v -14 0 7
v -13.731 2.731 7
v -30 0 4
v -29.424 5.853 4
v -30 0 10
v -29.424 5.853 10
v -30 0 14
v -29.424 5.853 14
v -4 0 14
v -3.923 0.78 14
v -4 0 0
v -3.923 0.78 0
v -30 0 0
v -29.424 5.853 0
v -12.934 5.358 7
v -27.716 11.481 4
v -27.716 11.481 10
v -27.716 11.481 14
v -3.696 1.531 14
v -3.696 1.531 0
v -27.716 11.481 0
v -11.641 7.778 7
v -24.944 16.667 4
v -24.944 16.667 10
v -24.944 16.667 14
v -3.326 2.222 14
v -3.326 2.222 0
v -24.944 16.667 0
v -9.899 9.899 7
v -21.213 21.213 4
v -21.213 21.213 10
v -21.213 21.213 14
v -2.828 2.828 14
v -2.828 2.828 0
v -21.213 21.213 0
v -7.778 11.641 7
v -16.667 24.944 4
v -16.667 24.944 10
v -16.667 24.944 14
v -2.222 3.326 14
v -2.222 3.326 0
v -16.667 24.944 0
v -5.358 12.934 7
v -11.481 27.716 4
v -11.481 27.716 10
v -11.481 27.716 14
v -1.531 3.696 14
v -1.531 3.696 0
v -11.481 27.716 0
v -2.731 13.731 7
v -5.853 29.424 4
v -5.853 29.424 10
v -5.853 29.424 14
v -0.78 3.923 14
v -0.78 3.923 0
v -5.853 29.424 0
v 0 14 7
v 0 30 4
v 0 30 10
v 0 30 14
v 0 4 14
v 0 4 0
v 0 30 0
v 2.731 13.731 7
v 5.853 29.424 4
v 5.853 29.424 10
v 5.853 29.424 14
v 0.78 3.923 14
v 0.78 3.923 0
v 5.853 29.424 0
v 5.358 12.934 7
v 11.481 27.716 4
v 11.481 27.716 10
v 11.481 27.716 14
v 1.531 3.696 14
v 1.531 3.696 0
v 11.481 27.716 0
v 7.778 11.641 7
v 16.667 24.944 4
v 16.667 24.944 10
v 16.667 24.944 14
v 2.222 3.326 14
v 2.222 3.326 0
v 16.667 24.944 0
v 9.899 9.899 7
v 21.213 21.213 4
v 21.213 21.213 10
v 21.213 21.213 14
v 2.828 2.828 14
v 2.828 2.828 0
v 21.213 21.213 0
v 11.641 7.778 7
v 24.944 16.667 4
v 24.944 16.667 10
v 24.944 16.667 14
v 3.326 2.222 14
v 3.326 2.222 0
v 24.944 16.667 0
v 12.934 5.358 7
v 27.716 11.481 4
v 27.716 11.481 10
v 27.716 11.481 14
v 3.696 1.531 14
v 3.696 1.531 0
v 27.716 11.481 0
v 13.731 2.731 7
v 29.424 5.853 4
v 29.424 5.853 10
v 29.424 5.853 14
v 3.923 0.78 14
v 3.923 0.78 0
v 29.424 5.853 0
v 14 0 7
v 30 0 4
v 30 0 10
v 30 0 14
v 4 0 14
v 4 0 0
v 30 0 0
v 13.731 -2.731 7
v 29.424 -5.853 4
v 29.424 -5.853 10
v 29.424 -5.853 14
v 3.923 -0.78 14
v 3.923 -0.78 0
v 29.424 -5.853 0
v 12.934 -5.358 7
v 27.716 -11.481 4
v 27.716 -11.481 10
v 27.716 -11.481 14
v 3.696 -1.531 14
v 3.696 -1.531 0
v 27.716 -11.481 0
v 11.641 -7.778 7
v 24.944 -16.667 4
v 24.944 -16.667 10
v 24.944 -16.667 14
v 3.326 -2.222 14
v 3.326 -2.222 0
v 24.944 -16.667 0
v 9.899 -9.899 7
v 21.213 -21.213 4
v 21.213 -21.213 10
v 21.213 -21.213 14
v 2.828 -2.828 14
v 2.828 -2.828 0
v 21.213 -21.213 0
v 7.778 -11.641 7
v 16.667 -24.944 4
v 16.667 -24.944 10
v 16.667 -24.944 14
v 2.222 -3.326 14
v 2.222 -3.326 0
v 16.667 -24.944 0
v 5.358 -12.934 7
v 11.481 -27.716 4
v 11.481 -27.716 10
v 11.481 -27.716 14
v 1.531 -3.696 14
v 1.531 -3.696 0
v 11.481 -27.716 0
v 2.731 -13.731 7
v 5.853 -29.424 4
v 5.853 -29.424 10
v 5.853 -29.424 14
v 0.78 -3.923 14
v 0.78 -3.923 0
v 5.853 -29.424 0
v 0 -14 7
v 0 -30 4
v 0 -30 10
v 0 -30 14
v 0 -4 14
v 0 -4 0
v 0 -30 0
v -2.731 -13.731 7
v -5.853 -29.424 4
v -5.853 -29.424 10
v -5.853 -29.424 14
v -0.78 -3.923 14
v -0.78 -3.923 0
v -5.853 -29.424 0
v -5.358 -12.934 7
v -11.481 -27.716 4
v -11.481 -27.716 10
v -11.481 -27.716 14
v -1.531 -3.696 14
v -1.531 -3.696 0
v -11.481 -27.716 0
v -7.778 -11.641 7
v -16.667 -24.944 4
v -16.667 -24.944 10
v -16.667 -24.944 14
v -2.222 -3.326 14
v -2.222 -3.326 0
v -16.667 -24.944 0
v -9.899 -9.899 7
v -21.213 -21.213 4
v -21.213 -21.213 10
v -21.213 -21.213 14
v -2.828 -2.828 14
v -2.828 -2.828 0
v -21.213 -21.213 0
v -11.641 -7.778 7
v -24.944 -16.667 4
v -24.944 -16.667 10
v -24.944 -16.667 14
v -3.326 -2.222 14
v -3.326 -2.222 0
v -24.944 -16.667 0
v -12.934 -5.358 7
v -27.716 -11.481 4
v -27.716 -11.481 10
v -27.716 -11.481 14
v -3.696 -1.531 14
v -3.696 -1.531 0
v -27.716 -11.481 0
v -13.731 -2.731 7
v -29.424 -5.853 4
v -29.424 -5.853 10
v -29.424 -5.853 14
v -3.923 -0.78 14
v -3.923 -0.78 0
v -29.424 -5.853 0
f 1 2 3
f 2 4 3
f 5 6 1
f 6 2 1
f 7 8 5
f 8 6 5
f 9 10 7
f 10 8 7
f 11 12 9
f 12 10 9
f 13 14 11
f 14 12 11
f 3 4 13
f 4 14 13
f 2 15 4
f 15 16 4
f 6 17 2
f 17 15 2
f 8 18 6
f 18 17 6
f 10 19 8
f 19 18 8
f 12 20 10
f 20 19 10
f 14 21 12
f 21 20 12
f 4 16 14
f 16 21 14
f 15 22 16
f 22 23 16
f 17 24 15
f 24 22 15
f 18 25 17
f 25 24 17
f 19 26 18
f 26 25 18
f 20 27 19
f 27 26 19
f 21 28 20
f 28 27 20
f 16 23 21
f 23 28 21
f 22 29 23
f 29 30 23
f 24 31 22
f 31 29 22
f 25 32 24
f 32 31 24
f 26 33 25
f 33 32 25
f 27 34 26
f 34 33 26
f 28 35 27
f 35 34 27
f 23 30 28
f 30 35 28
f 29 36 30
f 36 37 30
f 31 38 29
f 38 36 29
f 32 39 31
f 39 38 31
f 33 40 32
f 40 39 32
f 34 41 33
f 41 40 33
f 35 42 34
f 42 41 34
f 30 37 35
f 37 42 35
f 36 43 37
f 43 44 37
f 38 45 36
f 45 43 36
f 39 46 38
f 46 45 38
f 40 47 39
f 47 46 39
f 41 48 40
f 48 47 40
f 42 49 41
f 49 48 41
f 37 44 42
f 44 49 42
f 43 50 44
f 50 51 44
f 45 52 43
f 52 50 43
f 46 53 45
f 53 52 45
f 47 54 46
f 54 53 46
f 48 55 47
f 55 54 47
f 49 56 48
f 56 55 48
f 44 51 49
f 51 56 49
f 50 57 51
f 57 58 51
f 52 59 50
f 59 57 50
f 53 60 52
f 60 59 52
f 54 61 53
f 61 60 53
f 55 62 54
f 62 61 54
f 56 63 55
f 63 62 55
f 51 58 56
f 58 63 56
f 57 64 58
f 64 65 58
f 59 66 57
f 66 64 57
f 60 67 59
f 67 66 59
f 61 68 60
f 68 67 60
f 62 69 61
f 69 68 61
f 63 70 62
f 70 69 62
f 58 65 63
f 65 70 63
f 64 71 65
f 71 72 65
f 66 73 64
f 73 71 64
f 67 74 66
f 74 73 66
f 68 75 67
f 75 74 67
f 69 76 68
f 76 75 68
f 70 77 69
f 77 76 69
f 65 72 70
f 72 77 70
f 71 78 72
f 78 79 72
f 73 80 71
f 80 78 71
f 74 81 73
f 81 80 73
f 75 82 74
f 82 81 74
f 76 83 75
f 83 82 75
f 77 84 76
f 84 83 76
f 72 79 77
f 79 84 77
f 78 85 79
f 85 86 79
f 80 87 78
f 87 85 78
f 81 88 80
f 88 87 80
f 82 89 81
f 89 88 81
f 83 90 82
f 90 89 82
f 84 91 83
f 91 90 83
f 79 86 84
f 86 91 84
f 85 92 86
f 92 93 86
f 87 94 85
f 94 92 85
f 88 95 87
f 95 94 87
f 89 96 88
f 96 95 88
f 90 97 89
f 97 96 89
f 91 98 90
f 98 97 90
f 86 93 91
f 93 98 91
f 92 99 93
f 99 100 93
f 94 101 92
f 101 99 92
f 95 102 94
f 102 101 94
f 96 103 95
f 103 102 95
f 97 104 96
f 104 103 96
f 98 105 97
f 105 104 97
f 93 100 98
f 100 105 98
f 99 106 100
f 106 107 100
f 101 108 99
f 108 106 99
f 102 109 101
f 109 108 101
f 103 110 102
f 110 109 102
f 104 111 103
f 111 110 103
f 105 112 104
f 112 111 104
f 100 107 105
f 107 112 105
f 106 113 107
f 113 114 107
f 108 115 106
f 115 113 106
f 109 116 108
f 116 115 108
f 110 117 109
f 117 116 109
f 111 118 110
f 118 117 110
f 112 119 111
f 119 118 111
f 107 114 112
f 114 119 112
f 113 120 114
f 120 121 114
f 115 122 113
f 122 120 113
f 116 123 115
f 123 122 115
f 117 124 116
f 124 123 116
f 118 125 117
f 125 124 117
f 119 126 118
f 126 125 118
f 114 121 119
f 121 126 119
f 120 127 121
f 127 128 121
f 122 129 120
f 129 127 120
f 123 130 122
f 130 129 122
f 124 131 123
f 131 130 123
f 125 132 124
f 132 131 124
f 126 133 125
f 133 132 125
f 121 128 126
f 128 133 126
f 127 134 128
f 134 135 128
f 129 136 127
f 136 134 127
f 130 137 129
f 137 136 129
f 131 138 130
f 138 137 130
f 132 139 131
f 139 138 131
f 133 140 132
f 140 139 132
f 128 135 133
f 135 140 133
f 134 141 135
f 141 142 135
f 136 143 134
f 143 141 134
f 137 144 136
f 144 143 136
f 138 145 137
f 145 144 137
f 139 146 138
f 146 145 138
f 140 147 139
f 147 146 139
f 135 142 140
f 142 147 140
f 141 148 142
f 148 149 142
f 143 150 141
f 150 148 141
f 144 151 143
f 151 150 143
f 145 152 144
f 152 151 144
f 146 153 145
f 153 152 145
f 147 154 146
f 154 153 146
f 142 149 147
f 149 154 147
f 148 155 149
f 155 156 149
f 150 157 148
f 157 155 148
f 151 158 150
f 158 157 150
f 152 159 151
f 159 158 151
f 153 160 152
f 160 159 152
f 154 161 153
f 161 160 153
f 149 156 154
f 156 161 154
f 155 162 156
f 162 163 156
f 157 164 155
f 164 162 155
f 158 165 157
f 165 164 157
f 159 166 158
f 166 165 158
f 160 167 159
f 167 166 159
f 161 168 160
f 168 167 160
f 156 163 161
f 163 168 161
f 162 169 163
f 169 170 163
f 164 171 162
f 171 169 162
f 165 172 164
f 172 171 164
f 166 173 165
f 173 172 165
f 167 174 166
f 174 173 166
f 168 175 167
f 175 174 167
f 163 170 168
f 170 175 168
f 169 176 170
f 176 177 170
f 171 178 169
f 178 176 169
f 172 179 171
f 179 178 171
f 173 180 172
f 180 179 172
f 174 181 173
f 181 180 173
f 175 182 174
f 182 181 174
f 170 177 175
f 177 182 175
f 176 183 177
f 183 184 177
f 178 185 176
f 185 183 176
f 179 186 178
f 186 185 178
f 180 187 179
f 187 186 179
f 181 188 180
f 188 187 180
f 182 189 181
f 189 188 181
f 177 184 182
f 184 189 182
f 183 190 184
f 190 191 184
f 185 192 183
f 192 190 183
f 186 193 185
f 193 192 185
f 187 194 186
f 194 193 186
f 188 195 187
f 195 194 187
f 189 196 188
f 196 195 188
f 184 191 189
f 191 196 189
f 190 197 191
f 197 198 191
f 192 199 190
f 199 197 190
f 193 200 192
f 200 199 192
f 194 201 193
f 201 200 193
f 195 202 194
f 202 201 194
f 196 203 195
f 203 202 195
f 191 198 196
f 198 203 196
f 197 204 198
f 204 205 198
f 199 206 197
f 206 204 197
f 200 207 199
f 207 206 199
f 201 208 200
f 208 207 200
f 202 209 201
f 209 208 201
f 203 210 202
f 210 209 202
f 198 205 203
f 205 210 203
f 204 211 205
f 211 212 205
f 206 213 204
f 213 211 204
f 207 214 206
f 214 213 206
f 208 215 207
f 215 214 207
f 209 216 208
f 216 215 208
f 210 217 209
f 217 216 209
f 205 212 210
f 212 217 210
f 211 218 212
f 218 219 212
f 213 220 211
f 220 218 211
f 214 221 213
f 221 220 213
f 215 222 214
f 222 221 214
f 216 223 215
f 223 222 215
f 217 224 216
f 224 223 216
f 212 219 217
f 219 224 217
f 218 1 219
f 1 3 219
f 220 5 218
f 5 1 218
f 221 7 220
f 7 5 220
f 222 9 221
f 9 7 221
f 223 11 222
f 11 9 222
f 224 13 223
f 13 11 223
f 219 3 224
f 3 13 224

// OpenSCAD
$fn = 32;

// ----------------------------------------------------------------------
// Revolved part: V-groove pulley R30
// ----------------------------------------------------------------------

// --- parameters (mm) ---
bore_r = 4;               // bore radius
rim_r = 30;               // rim radius
rim_t = 14;               // rim width
groove_r = 14;            // groove root radius
groove_w = 3;             // groove half width
revolve_angle = 360;      // revolve sweep, degrees
fit_tol = 0.05;           // declared fit tolerance (prompt contract)
free_tol = 0.2;           // declared free tolerance (prompt contract)

bore_d = 2 * bore_r;
rim_d = 2 * rim_r;
groove_d = 2 * groove_r;

profile = [[4, 0], [30, 0], [30, 4], [14, 7], [30, 10], [30, 14], [4, 14]];  // primary outline, 7 points, counter clockwise

// --- the one profile operation ---
rotate_extrude(angle = revolve_angle) polygon(points = profile);
